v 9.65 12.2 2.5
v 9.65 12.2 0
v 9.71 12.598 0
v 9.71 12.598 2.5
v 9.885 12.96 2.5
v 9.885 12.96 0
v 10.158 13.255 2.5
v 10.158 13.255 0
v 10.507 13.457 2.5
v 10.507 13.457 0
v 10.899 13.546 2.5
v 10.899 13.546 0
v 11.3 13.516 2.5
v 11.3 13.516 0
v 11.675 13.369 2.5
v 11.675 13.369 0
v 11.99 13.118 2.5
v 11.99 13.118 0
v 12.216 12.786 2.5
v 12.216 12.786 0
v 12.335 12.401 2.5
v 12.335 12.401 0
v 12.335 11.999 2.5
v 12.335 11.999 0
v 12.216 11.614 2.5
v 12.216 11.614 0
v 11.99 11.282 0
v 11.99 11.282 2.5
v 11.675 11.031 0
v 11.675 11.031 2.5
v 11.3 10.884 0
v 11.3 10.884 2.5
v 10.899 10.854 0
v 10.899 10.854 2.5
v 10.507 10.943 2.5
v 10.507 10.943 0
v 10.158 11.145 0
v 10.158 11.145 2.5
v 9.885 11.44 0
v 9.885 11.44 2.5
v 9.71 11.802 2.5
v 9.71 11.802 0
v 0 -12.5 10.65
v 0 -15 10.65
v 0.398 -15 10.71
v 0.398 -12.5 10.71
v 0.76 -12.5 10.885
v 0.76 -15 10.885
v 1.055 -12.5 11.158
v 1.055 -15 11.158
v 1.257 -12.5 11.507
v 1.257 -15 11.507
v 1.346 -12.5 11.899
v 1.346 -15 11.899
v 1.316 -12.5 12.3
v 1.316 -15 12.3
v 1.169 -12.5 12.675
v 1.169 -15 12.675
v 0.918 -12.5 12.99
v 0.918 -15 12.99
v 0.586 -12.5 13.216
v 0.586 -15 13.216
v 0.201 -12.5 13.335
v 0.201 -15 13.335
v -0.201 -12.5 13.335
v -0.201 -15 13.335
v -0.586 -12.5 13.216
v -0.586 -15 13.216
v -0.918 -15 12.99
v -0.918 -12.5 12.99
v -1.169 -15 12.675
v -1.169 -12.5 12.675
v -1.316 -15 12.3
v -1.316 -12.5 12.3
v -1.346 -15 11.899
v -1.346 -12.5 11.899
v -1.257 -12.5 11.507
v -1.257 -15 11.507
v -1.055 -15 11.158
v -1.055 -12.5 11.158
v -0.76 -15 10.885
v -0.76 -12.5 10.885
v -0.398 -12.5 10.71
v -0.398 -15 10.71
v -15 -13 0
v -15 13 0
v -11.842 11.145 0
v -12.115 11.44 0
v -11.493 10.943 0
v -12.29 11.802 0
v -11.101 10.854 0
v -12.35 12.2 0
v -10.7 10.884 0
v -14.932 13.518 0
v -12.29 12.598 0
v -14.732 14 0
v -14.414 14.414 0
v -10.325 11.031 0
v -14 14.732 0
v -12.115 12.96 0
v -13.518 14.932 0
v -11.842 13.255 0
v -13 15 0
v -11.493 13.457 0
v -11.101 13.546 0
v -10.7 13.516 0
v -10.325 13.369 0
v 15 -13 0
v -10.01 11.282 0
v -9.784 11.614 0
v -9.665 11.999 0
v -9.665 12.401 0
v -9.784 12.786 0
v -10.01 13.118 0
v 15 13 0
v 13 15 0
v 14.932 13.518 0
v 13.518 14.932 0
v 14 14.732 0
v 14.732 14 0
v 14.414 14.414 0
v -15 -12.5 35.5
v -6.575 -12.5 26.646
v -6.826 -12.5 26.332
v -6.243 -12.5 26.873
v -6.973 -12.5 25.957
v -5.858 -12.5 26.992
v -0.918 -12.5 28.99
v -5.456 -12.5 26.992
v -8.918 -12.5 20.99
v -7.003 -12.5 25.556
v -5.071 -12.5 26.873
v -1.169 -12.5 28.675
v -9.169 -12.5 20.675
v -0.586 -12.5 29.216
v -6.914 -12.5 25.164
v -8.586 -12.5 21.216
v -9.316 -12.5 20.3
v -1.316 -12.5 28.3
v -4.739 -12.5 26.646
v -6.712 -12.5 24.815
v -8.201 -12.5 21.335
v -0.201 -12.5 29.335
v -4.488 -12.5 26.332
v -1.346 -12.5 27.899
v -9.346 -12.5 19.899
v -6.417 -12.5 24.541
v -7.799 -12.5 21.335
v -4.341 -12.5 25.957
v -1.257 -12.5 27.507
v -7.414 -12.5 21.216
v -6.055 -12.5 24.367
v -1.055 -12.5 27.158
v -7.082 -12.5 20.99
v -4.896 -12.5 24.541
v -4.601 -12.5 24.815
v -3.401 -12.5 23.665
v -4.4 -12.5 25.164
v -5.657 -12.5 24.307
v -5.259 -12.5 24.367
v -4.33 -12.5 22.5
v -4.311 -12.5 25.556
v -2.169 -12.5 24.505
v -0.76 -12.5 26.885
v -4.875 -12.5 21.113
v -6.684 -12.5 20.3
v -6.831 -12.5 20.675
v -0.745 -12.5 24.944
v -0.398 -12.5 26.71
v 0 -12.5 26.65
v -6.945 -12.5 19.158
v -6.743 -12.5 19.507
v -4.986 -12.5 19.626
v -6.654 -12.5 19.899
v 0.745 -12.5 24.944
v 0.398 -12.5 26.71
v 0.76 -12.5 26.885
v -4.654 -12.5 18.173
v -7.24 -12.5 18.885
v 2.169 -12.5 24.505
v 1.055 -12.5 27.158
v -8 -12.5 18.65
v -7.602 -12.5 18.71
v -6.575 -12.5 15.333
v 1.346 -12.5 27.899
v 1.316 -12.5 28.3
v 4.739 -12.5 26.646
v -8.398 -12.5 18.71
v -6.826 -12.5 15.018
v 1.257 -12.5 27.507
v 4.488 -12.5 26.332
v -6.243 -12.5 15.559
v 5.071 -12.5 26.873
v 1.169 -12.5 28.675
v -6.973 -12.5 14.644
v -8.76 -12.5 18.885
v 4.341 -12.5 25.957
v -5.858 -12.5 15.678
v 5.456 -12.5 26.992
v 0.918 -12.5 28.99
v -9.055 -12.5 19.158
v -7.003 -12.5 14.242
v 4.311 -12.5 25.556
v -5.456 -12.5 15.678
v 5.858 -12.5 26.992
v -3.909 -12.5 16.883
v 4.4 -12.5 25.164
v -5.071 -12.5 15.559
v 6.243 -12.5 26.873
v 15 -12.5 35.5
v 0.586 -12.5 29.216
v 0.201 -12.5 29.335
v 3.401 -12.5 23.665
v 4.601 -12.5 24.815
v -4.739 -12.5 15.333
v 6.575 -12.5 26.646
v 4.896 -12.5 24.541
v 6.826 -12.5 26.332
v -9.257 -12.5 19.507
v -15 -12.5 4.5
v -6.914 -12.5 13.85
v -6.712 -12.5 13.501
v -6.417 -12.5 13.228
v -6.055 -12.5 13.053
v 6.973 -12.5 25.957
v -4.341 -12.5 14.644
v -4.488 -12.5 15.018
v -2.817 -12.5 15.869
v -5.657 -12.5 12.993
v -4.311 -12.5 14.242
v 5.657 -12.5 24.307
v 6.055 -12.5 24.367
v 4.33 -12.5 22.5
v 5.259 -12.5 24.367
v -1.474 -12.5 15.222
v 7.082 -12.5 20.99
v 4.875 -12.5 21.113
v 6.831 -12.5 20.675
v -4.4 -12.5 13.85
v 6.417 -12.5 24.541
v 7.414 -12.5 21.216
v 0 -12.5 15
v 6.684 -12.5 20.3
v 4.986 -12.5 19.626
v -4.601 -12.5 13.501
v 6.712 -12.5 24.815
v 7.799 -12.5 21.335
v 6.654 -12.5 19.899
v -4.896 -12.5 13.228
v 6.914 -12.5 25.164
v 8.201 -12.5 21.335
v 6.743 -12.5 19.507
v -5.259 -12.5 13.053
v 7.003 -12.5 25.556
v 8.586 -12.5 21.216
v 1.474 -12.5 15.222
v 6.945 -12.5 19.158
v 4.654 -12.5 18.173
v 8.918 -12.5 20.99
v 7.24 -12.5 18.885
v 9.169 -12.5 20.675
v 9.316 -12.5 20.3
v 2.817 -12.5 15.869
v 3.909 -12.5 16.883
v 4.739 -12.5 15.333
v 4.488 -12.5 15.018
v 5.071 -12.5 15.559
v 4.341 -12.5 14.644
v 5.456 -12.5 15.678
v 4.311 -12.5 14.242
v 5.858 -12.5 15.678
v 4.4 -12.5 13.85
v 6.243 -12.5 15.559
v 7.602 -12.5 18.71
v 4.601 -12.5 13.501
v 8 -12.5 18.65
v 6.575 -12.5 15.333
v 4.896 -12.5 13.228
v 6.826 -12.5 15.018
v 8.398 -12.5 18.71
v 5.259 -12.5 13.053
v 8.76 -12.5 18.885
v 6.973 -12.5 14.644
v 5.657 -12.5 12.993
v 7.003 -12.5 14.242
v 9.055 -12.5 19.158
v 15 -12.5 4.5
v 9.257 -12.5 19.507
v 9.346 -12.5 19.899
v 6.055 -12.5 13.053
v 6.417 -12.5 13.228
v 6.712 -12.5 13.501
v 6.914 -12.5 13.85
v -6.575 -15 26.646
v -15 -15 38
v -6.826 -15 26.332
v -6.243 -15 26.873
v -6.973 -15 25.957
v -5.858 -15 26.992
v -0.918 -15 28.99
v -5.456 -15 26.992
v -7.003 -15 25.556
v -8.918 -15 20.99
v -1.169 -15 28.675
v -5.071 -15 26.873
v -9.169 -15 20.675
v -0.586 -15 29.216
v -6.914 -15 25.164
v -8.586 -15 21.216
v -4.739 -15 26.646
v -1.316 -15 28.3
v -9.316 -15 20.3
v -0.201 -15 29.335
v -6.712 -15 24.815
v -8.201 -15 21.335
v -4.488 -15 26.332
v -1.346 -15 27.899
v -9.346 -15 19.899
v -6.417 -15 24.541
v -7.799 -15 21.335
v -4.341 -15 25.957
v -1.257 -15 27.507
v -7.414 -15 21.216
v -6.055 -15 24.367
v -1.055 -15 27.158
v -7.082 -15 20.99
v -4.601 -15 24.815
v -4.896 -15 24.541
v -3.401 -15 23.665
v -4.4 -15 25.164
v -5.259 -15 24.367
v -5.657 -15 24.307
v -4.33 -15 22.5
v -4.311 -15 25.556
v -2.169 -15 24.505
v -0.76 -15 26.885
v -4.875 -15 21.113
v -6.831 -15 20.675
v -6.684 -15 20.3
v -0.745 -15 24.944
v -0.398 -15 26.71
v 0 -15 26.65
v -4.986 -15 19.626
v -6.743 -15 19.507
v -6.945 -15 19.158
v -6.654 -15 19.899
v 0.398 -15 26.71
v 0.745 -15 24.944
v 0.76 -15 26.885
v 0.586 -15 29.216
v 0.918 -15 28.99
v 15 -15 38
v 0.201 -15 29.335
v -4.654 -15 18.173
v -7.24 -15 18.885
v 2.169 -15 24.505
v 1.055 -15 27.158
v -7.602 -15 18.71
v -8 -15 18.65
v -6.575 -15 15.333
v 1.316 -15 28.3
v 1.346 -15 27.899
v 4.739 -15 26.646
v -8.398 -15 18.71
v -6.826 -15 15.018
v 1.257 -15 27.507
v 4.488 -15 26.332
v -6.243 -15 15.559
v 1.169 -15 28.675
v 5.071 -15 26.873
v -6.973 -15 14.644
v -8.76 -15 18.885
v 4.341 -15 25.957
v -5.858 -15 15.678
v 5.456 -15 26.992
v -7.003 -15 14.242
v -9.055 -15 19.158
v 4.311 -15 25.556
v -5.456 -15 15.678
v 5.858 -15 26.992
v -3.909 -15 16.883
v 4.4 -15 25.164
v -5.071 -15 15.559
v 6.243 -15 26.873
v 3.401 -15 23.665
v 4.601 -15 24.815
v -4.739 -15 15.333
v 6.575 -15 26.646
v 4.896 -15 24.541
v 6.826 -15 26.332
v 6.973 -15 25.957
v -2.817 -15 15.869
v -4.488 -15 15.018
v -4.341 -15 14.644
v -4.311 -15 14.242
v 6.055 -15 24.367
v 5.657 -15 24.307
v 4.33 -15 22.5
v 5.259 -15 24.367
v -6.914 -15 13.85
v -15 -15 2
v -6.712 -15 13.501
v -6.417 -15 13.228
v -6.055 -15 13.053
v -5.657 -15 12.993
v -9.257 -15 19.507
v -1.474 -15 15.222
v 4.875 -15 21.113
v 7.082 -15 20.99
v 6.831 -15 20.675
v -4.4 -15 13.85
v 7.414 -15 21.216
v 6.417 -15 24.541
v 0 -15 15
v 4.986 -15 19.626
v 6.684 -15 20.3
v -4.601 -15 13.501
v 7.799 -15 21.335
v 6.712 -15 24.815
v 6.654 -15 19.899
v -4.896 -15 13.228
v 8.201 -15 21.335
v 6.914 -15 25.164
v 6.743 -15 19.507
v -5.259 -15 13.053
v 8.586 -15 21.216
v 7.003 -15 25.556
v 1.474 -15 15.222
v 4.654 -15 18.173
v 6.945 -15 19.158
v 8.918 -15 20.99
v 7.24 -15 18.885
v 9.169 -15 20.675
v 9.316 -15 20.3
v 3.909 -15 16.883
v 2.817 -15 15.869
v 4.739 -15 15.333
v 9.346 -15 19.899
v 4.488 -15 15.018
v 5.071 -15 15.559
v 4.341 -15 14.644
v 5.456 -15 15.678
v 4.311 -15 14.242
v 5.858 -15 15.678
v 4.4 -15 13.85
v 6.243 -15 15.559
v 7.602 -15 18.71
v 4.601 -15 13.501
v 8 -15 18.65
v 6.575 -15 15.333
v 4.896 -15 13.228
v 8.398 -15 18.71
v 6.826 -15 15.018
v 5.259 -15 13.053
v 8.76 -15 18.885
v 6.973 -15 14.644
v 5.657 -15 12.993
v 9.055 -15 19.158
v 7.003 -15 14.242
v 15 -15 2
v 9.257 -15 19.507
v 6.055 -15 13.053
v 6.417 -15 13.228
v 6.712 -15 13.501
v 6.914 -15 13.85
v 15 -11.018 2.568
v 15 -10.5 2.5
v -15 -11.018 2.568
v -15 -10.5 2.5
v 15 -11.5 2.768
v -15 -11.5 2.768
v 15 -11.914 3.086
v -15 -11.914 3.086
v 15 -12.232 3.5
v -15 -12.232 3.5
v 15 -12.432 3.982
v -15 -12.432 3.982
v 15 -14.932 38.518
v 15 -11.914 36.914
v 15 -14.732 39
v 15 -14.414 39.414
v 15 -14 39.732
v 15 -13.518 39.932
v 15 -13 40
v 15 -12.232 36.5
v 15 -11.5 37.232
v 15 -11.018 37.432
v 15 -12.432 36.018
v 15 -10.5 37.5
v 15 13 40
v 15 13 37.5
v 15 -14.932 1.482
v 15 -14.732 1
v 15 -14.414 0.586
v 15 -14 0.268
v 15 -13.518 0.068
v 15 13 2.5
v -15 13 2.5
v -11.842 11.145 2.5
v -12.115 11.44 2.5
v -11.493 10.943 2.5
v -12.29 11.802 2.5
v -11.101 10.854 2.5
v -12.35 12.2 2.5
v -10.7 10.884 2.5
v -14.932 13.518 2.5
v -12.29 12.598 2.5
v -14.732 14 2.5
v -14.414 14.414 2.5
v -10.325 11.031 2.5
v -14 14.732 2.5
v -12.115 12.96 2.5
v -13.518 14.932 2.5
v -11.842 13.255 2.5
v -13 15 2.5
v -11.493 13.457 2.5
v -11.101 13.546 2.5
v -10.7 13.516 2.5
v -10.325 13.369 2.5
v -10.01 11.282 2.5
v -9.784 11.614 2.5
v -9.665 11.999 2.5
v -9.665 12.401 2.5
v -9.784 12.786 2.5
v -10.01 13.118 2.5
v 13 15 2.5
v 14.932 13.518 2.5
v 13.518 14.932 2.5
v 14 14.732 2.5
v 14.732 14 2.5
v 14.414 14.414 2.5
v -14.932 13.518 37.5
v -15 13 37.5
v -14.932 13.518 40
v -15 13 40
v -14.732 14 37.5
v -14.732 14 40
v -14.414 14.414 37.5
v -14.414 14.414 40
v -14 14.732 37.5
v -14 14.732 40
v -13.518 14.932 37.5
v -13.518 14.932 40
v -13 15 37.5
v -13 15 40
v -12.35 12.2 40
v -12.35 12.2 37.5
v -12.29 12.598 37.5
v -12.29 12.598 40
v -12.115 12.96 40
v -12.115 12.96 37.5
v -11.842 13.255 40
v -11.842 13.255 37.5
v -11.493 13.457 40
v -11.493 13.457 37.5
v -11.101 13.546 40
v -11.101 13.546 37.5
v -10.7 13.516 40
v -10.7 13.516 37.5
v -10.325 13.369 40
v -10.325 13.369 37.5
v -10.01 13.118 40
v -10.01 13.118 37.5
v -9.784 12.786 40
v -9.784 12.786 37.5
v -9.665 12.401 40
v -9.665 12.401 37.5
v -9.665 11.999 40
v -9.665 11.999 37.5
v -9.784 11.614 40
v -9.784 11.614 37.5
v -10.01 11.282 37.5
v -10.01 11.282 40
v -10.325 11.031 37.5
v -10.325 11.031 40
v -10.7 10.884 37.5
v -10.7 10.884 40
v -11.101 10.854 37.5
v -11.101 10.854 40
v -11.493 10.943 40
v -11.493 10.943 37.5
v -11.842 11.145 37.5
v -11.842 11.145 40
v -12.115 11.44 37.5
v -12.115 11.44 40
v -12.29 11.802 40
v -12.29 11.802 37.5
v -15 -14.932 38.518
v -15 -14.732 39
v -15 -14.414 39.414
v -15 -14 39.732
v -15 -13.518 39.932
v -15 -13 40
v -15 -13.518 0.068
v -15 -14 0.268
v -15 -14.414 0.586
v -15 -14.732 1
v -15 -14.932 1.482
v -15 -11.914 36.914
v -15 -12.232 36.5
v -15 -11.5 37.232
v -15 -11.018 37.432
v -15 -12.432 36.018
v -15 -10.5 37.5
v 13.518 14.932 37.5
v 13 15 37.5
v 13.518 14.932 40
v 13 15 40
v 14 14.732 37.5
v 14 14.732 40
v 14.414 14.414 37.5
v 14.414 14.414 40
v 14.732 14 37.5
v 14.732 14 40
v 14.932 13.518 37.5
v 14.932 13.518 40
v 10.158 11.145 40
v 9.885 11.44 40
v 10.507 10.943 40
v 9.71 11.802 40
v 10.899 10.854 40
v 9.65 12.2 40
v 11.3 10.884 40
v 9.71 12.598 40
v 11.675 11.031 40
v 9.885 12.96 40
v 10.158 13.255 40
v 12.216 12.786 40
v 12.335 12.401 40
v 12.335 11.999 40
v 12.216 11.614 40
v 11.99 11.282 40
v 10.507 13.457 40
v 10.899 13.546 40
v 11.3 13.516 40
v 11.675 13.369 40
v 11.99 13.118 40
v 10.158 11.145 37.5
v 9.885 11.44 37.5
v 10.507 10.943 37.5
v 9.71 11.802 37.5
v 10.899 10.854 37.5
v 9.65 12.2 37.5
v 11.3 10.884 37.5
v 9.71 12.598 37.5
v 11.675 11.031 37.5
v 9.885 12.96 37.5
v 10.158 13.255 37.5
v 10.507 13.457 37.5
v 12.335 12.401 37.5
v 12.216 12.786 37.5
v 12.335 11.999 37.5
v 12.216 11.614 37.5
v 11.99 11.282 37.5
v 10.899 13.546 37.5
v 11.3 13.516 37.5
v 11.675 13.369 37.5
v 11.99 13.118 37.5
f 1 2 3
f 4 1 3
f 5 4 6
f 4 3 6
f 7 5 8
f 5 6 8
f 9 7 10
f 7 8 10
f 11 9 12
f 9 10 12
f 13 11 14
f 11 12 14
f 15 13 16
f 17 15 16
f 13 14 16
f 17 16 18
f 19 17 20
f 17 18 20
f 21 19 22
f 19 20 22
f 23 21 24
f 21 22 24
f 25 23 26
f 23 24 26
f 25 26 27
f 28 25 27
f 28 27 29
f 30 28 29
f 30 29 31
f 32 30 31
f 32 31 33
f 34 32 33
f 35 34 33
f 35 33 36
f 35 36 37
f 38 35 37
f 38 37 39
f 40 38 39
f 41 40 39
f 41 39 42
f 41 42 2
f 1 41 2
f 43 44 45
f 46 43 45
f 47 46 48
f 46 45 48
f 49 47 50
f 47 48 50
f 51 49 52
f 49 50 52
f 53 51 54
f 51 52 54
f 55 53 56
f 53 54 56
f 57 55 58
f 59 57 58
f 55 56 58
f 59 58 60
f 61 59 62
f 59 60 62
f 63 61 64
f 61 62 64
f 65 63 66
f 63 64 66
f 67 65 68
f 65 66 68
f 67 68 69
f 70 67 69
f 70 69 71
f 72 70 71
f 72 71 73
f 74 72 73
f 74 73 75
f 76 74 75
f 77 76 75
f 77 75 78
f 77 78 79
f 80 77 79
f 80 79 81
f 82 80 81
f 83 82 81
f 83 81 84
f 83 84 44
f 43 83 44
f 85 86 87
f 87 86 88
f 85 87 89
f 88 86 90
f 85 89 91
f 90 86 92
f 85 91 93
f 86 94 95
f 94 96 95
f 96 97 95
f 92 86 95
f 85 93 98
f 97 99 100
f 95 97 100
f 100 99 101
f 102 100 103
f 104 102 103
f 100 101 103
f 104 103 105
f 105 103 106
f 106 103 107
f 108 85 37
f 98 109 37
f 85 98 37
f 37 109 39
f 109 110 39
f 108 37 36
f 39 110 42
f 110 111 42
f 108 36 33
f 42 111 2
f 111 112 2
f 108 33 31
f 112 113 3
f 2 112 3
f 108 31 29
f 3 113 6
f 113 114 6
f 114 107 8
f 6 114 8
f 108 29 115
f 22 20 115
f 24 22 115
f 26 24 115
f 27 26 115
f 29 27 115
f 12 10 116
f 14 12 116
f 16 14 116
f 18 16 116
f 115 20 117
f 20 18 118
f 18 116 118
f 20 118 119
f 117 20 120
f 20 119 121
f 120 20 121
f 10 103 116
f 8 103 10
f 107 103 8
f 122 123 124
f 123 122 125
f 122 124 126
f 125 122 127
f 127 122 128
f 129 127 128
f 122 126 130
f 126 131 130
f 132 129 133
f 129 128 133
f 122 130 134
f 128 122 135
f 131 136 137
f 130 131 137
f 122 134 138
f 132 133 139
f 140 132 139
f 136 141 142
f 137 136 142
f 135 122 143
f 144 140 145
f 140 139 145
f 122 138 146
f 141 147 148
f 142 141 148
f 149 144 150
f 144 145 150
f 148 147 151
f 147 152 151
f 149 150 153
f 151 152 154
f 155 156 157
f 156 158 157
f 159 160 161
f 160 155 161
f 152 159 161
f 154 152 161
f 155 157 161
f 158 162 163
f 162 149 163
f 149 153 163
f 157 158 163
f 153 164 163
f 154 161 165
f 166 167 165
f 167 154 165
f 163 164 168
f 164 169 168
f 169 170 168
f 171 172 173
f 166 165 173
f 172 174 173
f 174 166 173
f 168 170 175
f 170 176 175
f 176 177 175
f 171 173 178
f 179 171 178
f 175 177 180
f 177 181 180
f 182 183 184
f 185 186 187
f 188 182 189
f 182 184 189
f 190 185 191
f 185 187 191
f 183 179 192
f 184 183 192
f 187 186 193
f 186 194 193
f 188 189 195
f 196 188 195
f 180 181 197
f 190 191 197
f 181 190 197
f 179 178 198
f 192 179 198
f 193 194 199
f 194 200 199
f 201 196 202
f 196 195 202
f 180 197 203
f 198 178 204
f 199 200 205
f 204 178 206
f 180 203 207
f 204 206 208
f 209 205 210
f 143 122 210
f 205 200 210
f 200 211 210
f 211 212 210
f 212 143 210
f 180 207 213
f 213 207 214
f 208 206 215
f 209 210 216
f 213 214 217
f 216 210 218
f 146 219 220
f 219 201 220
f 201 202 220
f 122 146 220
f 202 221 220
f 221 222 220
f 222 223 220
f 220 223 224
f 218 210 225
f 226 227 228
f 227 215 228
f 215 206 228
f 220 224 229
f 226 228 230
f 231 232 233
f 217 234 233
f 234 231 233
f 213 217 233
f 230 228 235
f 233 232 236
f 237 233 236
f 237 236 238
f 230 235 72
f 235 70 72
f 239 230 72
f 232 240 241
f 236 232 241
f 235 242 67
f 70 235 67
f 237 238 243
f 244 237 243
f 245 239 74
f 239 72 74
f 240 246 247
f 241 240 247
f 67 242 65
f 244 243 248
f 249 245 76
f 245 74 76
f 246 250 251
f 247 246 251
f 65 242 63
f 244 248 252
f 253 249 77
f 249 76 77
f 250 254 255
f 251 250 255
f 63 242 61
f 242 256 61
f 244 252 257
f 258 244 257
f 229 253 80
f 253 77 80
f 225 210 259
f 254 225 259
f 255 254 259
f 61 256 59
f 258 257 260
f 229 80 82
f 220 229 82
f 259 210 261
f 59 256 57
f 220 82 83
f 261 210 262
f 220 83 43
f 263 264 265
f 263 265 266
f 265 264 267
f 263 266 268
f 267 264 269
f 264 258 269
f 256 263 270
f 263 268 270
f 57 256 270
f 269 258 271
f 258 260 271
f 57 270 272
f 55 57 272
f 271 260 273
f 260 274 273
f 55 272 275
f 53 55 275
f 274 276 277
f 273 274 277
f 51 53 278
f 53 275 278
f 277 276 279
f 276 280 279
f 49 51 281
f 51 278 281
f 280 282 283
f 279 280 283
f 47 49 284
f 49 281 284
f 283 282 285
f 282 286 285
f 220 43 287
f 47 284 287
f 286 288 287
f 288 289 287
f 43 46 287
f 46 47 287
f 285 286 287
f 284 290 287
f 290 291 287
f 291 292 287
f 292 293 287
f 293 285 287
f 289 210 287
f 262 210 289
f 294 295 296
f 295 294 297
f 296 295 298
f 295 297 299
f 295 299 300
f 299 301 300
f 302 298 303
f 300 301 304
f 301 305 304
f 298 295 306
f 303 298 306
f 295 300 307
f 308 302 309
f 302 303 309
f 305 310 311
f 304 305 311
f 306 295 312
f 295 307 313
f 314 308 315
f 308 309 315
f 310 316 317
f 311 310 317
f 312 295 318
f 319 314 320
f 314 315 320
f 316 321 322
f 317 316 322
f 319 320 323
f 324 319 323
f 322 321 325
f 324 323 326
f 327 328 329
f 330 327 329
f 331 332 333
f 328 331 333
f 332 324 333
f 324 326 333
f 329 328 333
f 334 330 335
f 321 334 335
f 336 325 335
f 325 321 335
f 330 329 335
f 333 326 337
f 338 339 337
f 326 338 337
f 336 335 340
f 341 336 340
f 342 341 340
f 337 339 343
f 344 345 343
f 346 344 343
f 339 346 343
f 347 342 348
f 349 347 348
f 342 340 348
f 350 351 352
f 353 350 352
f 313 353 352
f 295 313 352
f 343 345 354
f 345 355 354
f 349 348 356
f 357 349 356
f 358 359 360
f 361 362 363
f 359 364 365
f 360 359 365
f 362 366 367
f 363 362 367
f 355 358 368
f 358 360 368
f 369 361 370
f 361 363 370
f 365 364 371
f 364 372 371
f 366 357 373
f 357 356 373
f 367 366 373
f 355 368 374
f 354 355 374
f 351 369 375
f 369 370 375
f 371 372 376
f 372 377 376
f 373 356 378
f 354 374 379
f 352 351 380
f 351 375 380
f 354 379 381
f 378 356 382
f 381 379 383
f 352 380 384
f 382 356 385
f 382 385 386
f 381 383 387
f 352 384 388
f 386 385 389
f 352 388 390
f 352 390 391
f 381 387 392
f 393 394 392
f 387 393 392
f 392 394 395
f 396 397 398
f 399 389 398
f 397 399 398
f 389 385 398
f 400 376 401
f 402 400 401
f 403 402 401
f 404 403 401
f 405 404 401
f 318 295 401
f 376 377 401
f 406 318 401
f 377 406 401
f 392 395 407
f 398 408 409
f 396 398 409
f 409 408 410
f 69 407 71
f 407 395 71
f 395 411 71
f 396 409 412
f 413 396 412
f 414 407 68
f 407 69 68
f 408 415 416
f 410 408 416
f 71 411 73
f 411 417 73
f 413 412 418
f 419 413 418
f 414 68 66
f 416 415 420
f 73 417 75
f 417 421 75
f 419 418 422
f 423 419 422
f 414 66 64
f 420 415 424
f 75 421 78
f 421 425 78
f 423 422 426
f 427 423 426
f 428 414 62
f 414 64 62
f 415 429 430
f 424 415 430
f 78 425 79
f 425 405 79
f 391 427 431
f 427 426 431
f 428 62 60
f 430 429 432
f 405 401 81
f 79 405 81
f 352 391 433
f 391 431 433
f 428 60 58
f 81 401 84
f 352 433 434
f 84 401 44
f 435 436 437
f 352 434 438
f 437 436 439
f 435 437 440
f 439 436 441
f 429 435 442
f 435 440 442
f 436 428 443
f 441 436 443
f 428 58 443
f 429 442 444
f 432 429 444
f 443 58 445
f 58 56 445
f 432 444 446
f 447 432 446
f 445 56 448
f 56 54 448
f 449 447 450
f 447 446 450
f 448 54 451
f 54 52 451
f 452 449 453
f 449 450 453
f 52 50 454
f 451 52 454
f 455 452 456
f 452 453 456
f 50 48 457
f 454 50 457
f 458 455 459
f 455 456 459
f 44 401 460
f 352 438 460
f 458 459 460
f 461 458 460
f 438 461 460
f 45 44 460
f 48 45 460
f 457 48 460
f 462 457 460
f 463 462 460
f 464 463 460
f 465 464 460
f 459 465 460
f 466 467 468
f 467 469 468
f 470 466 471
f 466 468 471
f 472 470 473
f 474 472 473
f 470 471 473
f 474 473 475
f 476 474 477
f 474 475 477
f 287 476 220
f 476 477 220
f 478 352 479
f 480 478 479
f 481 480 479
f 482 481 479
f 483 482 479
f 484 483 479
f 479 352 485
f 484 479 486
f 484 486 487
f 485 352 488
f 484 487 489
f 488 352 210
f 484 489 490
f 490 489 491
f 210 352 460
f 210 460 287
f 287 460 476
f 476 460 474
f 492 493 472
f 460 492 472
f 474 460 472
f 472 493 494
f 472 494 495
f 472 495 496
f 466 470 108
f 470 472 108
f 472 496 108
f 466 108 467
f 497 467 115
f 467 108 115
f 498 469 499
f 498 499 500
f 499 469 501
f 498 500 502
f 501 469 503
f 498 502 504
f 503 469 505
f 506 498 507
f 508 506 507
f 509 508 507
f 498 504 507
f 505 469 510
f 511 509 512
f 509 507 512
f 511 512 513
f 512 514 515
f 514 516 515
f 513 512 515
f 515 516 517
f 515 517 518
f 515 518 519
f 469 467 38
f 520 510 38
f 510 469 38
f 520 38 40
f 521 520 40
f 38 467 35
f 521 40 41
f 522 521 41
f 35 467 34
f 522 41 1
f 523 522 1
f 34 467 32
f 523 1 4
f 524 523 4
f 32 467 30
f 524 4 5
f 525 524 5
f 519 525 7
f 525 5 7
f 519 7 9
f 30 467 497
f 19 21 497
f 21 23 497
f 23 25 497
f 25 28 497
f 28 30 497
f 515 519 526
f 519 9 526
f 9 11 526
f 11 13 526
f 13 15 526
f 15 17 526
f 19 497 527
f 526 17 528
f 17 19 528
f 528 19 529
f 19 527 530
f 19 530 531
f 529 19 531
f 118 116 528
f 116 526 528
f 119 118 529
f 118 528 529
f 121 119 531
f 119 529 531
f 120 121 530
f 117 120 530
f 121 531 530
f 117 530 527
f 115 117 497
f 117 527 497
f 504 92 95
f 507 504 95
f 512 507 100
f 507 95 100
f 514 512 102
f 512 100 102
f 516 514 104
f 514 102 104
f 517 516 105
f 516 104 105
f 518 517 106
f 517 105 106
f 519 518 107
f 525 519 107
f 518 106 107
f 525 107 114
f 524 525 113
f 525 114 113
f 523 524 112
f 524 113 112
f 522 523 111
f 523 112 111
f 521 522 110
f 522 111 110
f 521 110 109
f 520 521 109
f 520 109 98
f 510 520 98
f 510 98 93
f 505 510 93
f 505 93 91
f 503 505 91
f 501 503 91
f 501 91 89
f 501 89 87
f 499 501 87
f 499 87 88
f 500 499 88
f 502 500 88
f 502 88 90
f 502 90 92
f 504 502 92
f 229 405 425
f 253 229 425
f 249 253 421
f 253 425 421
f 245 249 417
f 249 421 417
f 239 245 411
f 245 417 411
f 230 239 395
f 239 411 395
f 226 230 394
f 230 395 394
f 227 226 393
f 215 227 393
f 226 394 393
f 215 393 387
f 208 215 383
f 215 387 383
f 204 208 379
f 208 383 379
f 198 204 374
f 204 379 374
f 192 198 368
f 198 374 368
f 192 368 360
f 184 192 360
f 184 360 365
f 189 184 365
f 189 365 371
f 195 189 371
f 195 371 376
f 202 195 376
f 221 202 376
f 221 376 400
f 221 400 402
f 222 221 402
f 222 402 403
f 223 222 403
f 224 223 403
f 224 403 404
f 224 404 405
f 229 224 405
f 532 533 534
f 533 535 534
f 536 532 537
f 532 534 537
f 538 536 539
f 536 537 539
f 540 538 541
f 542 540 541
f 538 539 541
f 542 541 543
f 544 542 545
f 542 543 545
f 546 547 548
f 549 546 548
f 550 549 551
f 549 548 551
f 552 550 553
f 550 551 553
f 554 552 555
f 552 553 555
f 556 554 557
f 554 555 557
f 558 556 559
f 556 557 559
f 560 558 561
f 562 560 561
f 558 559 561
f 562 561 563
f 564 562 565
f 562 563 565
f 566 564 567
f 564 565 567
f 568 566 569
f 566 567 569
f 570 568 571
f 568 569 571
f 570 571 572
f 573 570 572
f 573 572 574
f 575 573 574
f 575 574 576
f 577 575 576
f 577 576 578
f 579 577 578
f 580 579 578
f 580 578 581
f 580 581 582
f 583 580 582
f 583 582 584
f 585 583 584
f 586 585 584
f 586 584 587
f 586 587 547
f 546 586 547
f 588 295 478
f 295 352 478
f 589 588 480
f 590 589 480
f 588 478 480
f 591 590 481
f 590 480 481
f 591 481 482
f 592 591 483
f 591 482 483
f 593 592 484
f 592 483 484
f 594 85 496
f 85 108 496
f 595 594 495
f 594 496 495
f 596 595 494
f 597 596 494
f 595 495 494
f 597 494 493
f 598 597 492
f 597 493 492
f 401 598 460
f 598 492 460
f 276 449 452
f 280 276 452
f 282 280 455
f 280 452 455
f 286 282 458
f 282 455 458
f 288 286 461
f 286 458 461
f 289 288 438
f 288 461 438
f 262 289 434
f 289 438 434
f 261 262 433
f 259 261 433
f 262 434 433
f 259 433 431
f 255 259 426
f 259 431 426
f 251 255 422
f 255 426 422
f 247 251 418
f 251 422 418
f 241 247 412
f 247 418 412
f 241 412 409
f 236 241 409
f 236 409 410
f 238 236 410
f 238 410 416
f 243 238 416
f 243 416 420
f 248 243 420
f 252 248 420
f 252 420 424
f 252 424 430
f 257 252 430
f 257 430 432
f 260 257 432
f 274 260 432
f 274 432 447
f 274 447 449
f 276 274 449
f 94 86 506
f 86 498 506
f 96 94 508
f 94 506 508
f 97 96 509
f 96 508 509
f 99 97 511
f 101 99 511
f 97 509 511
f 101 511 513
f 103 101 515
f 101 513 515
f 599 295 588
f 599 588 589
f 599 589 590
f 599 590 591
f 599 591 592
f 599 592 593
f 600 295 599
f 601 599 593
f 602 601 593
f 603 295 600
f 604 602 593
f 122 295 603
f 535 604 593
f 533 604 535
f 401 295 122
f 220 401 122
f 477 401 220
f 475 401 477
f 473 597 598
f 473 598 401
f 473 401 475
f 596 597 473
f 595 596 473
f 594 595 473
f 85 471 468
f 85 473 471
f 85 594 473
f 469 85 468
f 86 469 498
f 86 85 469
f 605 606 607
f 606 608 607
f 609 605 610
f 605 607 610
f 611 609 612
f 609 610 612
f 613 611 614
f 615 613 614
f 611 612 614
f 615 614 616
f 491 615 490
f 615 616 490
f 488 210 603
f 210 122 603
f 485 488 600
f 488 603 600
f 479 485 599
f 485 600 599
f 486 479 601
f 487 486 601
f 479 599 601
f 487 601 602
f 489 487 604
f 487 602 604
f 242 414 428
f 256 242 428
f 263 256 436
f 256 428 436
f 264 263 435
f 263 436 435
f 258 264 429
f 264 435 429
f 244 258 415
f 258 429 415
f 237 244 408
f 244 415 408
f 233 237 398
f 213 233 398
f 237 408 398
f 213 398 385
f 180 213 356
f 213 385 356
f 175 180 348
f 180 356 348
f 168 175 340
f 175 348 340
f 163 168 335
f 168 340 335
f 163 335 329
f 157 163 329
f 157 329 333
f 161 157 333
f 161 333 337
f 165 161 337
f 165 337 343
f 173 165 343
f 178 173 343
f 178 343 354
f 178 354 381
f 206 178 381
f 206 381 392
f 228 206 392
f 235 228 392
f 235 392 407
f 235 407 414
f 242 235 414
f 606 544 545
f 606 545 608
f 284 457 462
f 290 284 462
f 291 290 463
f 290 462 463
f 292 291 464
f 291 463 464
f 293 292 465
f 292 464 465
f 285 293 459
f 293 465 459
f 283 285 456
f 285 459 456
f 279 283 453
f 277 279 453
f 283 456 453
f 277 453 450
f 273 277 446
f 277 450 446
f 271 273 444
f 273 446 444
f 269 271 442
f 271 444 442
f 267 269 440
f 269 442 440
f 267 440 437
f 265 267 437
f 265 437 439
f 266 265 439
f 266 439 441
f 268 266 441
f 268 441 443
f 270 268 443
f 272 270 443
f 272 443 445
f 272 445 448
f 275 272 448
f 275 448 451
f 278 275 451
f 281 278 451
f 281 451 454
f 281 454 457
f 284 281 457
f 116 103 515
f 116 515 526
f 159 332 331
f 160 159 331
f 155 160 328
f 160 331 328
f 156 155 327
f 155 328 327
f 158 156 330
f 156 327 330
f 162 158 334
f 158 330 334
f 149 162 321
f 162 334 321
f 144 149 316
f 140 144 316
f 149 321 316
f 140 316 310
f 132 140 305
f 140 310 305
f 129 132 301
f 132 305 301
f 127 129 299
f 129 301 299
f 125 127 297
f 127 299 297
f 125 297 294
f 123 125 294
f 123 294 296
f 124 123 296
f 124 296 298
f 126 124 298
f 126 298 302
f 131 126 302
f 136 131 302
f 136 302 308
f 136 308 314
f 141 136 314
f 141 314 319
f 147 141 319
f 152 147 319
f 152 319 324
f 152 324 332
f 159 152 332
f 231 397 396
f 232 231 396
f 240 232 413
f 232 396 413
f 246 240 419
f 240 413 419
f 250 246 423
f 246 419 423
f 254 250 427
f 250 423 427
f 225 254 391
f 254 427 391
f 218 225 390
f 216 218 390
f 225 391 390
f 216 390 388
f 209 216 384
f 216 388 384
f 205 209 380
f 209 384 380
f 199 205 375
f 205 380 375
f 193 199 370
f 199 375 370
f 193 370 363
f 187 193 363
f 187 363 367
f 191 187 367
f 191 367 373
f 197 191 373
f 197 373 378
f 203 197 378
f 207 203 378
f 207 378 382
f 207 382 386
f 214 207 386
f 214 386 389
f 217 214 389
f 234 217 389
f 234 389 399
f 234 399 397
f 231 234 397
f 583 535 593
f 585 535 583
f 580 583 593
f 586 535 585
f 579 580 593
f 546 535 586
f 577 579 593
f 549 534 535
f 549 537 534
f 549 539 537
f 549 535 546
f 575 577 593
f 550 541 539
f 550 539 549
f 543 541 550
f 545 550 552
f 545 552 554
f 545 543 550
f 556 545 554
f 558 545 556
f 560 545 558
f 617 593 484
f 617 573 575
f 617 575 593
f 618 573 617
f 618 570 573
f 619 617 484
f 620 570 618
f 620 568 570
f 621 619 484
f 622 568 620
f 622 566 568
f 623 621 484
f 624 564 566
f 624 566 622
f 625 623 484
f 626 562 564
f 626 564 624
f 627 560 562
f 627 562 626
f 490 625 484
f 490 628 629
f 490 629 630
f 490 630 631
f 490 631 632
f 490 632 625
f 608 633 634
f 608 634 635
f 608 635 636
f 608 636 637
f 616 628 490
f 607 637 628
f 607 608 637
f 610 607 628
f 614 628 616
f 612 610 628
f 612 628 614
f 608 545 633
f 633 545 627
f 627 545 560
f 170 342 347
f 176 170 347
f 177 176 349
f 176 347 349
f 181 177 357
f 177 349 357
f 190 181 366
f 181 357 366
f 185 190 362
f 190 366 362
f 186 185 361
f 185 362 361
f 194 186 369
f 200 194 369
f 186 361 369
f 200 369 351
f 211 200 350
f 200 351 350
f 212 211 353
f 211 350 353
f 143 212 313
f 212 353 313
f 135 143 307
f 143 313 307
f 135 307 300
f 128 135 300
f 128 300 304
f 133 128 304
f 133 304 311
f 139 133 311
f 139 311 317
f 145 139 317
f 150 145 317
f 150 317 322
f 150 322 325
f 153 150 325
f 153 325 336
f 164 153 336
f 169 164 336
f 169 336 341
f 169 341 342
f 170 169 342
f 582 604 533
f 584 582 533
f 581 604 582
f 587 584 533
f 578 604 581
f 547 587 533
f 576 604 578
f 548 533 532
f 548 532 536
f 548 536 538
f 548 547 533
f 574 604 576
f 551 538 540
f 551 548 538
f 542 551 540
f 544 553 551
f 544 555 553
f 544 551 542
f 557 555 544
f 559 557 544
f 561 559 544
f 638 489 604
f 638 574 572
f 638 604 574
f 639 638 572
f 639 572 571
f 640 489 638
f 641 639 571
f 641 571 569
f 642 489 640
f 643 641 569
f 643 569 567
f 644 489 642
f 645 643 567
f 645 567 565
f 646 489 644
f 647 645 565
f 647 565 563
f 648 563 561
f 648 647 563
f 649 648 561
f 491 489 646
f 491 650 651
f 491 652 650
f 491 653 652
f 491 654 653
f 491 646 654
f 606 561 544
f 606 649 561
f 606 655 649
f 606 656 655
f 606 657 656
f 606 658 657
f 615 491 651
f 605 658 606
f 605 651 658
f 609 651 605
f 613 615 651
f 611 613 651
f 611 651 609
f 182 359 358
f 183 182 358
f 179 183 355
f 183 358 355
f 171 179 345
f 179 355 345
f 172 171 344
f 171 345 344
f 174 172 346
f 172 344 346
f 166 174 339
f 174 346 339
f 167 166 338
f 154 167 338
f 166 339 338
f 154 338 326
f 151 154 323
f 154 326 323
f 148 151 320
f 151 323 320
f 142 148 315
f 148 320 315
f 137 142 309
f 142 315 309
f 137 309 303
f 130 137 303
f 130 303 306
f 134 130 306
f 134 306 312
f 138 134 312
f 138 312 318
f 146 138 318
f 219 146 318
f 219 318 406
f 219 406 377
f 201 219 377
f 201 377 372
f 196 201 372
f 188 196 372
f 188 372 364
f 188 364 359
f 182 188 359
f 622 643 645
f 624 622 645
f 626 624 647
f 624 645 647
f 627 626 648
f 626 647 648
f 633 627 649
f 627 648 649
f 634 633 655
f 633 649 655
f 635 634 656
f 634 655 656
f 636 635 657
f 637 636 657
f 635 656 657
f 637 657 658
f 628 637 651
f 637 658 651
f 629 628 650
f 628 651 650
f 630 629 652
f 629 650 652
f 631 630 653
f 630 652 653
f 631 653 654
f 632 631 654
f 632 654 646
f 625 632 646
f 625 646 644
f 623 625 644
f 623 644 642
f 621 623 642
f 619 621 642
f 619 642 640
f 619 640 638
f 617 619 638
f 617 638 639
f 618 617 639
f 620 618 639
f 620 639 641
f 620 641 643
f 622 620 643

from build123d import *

# Parameters (mm, degrees)
ESBO_O1_W                = 30
ESBO_O1_H                = 30
RESSALTO_EXTRUS_O1_DEPTH = 40
ESBO_O2_W                = 35
ESBO_O2_H                = 27.5
CORTE_EXTRUS_O1_DEPTH    = 40
FILETE1_R                = 2
FILETE2_R                = 2
ESBO_O4_R                = 5
CORTE_EXTRUS_O3_DEPTH    = 53.201532545
ESBO_O5_R                = 1.35
CORTE_EXTRUS_O5_DEPTH    = 53.201532545
ESBO_O7_R                = 1.35
CORTE_EXTRUS_O6_DEPTH    = 46.276925691


with BuildPart() as part:
    # Esboço1 → Ressalto-extrusão1 (new body)
    with BuildSketch(Plane.XY):
        Rectangle(ESBO_O1_W, ESBO_O1_H)
    extrude(amount=RESSALTO_EXTRUS_O1_DEPTH)

    # Esboço2 → Corte-extrusão1 (cut)
    with BuildSketch(Plane(origin=(15, 0, 0), x_dir=(0, 0, -1), z_dir=(1, 0, 0))):
        with Locations((-20, 1.25)):
            Rectangle(ESBO_O2_W, ESBO_O2_H)
    extrude(amount=-CORTE_EXTRUS_O1_DEPTH, mode=Mode.SUBTRACT)

    # Filete1
    filete1_edges = [part.edges().sort_by_distance(p)[0] for p in [
        (-15, 15, 1.25),
        (15, 15, 1.25),
        (-15, 15, 38.75),
        (15, 15, 38.75),
    ]]
    fillet(filete1_edges, radius=FILETE1_R)

    # Filete2
    filete2_edges = [part.edges().sort_by_distance(p)[0] for p in [
        (0, -15, 40),
        (0, -12.5, 2.5),
        (0, -12.5, 37.5),
        (0, -15, 0),
    ]]
    fillet(filete2_edges, radius=FILETE2_R)

    # Esboço4 → Corte-extrusão3 (cut, through all)
    with BuildSketch(Plane(origin=(0, -15, 0), x_dir=(-1, 0, 0), z_dir=(0, -1, 0))):
        with Locations(Location((0, -20, 0), (0, 0, 90))):
            Circle(ESBO_O4_R)
    extrude(amount=-CORTE_EXTRUS_O3_DEPTH, mode=Mode.SUBTRACT)

    # Esboço5 → Corte-extrusão5 (cut, through all)
    with BuildSketch(Plane(origin=(0, -15, 0), x_dir=(-1, 0, 0), z_dir=(0, -1, 0))):
        with Locations(Location((0, -28, 0), (0, 0, 90))):
            Circle(ESBO_O5_R)
        with Locations(Location((-5.656854249, -25.656854249, 0), (0, 0, 90))):
            Circle(ESBO_O5_R)
        with Locations(Location((-8, -20, 0), (0, 0, 90))):
            Circle(ESBO_O5_R)
        with Locations(Location((-5.656854251, -14.343145752, 0), (0, 0, 90))):
            Circle(ESBO_O5_R)
        with Locations(Location((0, -12, 0), (0, 0, 90))):
            Circle(ESBO_O5_R)
        with Locations(Location((5.656854251, -14.343145752, 0), (0, 0, 90))):
            Circle(ESBO_O5_R)
        with Locations(Location((8, -20, 0), (0, 0, 90))):
            Circle(ESBO_O5_R)
        with Locations(Location((5.656854249, -25.656854249, 0), (0, 0, 90))):
            Circle(ESBO_O5_R)
    extrude(amount=-CORTE_EXTRUS_O5_DEPTH, mode=Mode.SUBTRACT)

    # Esboço7 → Corte-extrusão6 (cut, through all)
    with BuildSketch(Plane(origin=(0, 0, 0), x_dir=(-1, 0, 0), z_dir=(0, 0, -1))):
        with Locations((-11, 12.2)):
            Circle(ESBO_O7_R)
        with Locations((11, 12.2)):
            Circle(ESBO_O7_R)
    extrude(amount=-CORTE_EXTRUS_O6_DEPTH, mode=Mode.SUBTRACT)


solid = part.part
